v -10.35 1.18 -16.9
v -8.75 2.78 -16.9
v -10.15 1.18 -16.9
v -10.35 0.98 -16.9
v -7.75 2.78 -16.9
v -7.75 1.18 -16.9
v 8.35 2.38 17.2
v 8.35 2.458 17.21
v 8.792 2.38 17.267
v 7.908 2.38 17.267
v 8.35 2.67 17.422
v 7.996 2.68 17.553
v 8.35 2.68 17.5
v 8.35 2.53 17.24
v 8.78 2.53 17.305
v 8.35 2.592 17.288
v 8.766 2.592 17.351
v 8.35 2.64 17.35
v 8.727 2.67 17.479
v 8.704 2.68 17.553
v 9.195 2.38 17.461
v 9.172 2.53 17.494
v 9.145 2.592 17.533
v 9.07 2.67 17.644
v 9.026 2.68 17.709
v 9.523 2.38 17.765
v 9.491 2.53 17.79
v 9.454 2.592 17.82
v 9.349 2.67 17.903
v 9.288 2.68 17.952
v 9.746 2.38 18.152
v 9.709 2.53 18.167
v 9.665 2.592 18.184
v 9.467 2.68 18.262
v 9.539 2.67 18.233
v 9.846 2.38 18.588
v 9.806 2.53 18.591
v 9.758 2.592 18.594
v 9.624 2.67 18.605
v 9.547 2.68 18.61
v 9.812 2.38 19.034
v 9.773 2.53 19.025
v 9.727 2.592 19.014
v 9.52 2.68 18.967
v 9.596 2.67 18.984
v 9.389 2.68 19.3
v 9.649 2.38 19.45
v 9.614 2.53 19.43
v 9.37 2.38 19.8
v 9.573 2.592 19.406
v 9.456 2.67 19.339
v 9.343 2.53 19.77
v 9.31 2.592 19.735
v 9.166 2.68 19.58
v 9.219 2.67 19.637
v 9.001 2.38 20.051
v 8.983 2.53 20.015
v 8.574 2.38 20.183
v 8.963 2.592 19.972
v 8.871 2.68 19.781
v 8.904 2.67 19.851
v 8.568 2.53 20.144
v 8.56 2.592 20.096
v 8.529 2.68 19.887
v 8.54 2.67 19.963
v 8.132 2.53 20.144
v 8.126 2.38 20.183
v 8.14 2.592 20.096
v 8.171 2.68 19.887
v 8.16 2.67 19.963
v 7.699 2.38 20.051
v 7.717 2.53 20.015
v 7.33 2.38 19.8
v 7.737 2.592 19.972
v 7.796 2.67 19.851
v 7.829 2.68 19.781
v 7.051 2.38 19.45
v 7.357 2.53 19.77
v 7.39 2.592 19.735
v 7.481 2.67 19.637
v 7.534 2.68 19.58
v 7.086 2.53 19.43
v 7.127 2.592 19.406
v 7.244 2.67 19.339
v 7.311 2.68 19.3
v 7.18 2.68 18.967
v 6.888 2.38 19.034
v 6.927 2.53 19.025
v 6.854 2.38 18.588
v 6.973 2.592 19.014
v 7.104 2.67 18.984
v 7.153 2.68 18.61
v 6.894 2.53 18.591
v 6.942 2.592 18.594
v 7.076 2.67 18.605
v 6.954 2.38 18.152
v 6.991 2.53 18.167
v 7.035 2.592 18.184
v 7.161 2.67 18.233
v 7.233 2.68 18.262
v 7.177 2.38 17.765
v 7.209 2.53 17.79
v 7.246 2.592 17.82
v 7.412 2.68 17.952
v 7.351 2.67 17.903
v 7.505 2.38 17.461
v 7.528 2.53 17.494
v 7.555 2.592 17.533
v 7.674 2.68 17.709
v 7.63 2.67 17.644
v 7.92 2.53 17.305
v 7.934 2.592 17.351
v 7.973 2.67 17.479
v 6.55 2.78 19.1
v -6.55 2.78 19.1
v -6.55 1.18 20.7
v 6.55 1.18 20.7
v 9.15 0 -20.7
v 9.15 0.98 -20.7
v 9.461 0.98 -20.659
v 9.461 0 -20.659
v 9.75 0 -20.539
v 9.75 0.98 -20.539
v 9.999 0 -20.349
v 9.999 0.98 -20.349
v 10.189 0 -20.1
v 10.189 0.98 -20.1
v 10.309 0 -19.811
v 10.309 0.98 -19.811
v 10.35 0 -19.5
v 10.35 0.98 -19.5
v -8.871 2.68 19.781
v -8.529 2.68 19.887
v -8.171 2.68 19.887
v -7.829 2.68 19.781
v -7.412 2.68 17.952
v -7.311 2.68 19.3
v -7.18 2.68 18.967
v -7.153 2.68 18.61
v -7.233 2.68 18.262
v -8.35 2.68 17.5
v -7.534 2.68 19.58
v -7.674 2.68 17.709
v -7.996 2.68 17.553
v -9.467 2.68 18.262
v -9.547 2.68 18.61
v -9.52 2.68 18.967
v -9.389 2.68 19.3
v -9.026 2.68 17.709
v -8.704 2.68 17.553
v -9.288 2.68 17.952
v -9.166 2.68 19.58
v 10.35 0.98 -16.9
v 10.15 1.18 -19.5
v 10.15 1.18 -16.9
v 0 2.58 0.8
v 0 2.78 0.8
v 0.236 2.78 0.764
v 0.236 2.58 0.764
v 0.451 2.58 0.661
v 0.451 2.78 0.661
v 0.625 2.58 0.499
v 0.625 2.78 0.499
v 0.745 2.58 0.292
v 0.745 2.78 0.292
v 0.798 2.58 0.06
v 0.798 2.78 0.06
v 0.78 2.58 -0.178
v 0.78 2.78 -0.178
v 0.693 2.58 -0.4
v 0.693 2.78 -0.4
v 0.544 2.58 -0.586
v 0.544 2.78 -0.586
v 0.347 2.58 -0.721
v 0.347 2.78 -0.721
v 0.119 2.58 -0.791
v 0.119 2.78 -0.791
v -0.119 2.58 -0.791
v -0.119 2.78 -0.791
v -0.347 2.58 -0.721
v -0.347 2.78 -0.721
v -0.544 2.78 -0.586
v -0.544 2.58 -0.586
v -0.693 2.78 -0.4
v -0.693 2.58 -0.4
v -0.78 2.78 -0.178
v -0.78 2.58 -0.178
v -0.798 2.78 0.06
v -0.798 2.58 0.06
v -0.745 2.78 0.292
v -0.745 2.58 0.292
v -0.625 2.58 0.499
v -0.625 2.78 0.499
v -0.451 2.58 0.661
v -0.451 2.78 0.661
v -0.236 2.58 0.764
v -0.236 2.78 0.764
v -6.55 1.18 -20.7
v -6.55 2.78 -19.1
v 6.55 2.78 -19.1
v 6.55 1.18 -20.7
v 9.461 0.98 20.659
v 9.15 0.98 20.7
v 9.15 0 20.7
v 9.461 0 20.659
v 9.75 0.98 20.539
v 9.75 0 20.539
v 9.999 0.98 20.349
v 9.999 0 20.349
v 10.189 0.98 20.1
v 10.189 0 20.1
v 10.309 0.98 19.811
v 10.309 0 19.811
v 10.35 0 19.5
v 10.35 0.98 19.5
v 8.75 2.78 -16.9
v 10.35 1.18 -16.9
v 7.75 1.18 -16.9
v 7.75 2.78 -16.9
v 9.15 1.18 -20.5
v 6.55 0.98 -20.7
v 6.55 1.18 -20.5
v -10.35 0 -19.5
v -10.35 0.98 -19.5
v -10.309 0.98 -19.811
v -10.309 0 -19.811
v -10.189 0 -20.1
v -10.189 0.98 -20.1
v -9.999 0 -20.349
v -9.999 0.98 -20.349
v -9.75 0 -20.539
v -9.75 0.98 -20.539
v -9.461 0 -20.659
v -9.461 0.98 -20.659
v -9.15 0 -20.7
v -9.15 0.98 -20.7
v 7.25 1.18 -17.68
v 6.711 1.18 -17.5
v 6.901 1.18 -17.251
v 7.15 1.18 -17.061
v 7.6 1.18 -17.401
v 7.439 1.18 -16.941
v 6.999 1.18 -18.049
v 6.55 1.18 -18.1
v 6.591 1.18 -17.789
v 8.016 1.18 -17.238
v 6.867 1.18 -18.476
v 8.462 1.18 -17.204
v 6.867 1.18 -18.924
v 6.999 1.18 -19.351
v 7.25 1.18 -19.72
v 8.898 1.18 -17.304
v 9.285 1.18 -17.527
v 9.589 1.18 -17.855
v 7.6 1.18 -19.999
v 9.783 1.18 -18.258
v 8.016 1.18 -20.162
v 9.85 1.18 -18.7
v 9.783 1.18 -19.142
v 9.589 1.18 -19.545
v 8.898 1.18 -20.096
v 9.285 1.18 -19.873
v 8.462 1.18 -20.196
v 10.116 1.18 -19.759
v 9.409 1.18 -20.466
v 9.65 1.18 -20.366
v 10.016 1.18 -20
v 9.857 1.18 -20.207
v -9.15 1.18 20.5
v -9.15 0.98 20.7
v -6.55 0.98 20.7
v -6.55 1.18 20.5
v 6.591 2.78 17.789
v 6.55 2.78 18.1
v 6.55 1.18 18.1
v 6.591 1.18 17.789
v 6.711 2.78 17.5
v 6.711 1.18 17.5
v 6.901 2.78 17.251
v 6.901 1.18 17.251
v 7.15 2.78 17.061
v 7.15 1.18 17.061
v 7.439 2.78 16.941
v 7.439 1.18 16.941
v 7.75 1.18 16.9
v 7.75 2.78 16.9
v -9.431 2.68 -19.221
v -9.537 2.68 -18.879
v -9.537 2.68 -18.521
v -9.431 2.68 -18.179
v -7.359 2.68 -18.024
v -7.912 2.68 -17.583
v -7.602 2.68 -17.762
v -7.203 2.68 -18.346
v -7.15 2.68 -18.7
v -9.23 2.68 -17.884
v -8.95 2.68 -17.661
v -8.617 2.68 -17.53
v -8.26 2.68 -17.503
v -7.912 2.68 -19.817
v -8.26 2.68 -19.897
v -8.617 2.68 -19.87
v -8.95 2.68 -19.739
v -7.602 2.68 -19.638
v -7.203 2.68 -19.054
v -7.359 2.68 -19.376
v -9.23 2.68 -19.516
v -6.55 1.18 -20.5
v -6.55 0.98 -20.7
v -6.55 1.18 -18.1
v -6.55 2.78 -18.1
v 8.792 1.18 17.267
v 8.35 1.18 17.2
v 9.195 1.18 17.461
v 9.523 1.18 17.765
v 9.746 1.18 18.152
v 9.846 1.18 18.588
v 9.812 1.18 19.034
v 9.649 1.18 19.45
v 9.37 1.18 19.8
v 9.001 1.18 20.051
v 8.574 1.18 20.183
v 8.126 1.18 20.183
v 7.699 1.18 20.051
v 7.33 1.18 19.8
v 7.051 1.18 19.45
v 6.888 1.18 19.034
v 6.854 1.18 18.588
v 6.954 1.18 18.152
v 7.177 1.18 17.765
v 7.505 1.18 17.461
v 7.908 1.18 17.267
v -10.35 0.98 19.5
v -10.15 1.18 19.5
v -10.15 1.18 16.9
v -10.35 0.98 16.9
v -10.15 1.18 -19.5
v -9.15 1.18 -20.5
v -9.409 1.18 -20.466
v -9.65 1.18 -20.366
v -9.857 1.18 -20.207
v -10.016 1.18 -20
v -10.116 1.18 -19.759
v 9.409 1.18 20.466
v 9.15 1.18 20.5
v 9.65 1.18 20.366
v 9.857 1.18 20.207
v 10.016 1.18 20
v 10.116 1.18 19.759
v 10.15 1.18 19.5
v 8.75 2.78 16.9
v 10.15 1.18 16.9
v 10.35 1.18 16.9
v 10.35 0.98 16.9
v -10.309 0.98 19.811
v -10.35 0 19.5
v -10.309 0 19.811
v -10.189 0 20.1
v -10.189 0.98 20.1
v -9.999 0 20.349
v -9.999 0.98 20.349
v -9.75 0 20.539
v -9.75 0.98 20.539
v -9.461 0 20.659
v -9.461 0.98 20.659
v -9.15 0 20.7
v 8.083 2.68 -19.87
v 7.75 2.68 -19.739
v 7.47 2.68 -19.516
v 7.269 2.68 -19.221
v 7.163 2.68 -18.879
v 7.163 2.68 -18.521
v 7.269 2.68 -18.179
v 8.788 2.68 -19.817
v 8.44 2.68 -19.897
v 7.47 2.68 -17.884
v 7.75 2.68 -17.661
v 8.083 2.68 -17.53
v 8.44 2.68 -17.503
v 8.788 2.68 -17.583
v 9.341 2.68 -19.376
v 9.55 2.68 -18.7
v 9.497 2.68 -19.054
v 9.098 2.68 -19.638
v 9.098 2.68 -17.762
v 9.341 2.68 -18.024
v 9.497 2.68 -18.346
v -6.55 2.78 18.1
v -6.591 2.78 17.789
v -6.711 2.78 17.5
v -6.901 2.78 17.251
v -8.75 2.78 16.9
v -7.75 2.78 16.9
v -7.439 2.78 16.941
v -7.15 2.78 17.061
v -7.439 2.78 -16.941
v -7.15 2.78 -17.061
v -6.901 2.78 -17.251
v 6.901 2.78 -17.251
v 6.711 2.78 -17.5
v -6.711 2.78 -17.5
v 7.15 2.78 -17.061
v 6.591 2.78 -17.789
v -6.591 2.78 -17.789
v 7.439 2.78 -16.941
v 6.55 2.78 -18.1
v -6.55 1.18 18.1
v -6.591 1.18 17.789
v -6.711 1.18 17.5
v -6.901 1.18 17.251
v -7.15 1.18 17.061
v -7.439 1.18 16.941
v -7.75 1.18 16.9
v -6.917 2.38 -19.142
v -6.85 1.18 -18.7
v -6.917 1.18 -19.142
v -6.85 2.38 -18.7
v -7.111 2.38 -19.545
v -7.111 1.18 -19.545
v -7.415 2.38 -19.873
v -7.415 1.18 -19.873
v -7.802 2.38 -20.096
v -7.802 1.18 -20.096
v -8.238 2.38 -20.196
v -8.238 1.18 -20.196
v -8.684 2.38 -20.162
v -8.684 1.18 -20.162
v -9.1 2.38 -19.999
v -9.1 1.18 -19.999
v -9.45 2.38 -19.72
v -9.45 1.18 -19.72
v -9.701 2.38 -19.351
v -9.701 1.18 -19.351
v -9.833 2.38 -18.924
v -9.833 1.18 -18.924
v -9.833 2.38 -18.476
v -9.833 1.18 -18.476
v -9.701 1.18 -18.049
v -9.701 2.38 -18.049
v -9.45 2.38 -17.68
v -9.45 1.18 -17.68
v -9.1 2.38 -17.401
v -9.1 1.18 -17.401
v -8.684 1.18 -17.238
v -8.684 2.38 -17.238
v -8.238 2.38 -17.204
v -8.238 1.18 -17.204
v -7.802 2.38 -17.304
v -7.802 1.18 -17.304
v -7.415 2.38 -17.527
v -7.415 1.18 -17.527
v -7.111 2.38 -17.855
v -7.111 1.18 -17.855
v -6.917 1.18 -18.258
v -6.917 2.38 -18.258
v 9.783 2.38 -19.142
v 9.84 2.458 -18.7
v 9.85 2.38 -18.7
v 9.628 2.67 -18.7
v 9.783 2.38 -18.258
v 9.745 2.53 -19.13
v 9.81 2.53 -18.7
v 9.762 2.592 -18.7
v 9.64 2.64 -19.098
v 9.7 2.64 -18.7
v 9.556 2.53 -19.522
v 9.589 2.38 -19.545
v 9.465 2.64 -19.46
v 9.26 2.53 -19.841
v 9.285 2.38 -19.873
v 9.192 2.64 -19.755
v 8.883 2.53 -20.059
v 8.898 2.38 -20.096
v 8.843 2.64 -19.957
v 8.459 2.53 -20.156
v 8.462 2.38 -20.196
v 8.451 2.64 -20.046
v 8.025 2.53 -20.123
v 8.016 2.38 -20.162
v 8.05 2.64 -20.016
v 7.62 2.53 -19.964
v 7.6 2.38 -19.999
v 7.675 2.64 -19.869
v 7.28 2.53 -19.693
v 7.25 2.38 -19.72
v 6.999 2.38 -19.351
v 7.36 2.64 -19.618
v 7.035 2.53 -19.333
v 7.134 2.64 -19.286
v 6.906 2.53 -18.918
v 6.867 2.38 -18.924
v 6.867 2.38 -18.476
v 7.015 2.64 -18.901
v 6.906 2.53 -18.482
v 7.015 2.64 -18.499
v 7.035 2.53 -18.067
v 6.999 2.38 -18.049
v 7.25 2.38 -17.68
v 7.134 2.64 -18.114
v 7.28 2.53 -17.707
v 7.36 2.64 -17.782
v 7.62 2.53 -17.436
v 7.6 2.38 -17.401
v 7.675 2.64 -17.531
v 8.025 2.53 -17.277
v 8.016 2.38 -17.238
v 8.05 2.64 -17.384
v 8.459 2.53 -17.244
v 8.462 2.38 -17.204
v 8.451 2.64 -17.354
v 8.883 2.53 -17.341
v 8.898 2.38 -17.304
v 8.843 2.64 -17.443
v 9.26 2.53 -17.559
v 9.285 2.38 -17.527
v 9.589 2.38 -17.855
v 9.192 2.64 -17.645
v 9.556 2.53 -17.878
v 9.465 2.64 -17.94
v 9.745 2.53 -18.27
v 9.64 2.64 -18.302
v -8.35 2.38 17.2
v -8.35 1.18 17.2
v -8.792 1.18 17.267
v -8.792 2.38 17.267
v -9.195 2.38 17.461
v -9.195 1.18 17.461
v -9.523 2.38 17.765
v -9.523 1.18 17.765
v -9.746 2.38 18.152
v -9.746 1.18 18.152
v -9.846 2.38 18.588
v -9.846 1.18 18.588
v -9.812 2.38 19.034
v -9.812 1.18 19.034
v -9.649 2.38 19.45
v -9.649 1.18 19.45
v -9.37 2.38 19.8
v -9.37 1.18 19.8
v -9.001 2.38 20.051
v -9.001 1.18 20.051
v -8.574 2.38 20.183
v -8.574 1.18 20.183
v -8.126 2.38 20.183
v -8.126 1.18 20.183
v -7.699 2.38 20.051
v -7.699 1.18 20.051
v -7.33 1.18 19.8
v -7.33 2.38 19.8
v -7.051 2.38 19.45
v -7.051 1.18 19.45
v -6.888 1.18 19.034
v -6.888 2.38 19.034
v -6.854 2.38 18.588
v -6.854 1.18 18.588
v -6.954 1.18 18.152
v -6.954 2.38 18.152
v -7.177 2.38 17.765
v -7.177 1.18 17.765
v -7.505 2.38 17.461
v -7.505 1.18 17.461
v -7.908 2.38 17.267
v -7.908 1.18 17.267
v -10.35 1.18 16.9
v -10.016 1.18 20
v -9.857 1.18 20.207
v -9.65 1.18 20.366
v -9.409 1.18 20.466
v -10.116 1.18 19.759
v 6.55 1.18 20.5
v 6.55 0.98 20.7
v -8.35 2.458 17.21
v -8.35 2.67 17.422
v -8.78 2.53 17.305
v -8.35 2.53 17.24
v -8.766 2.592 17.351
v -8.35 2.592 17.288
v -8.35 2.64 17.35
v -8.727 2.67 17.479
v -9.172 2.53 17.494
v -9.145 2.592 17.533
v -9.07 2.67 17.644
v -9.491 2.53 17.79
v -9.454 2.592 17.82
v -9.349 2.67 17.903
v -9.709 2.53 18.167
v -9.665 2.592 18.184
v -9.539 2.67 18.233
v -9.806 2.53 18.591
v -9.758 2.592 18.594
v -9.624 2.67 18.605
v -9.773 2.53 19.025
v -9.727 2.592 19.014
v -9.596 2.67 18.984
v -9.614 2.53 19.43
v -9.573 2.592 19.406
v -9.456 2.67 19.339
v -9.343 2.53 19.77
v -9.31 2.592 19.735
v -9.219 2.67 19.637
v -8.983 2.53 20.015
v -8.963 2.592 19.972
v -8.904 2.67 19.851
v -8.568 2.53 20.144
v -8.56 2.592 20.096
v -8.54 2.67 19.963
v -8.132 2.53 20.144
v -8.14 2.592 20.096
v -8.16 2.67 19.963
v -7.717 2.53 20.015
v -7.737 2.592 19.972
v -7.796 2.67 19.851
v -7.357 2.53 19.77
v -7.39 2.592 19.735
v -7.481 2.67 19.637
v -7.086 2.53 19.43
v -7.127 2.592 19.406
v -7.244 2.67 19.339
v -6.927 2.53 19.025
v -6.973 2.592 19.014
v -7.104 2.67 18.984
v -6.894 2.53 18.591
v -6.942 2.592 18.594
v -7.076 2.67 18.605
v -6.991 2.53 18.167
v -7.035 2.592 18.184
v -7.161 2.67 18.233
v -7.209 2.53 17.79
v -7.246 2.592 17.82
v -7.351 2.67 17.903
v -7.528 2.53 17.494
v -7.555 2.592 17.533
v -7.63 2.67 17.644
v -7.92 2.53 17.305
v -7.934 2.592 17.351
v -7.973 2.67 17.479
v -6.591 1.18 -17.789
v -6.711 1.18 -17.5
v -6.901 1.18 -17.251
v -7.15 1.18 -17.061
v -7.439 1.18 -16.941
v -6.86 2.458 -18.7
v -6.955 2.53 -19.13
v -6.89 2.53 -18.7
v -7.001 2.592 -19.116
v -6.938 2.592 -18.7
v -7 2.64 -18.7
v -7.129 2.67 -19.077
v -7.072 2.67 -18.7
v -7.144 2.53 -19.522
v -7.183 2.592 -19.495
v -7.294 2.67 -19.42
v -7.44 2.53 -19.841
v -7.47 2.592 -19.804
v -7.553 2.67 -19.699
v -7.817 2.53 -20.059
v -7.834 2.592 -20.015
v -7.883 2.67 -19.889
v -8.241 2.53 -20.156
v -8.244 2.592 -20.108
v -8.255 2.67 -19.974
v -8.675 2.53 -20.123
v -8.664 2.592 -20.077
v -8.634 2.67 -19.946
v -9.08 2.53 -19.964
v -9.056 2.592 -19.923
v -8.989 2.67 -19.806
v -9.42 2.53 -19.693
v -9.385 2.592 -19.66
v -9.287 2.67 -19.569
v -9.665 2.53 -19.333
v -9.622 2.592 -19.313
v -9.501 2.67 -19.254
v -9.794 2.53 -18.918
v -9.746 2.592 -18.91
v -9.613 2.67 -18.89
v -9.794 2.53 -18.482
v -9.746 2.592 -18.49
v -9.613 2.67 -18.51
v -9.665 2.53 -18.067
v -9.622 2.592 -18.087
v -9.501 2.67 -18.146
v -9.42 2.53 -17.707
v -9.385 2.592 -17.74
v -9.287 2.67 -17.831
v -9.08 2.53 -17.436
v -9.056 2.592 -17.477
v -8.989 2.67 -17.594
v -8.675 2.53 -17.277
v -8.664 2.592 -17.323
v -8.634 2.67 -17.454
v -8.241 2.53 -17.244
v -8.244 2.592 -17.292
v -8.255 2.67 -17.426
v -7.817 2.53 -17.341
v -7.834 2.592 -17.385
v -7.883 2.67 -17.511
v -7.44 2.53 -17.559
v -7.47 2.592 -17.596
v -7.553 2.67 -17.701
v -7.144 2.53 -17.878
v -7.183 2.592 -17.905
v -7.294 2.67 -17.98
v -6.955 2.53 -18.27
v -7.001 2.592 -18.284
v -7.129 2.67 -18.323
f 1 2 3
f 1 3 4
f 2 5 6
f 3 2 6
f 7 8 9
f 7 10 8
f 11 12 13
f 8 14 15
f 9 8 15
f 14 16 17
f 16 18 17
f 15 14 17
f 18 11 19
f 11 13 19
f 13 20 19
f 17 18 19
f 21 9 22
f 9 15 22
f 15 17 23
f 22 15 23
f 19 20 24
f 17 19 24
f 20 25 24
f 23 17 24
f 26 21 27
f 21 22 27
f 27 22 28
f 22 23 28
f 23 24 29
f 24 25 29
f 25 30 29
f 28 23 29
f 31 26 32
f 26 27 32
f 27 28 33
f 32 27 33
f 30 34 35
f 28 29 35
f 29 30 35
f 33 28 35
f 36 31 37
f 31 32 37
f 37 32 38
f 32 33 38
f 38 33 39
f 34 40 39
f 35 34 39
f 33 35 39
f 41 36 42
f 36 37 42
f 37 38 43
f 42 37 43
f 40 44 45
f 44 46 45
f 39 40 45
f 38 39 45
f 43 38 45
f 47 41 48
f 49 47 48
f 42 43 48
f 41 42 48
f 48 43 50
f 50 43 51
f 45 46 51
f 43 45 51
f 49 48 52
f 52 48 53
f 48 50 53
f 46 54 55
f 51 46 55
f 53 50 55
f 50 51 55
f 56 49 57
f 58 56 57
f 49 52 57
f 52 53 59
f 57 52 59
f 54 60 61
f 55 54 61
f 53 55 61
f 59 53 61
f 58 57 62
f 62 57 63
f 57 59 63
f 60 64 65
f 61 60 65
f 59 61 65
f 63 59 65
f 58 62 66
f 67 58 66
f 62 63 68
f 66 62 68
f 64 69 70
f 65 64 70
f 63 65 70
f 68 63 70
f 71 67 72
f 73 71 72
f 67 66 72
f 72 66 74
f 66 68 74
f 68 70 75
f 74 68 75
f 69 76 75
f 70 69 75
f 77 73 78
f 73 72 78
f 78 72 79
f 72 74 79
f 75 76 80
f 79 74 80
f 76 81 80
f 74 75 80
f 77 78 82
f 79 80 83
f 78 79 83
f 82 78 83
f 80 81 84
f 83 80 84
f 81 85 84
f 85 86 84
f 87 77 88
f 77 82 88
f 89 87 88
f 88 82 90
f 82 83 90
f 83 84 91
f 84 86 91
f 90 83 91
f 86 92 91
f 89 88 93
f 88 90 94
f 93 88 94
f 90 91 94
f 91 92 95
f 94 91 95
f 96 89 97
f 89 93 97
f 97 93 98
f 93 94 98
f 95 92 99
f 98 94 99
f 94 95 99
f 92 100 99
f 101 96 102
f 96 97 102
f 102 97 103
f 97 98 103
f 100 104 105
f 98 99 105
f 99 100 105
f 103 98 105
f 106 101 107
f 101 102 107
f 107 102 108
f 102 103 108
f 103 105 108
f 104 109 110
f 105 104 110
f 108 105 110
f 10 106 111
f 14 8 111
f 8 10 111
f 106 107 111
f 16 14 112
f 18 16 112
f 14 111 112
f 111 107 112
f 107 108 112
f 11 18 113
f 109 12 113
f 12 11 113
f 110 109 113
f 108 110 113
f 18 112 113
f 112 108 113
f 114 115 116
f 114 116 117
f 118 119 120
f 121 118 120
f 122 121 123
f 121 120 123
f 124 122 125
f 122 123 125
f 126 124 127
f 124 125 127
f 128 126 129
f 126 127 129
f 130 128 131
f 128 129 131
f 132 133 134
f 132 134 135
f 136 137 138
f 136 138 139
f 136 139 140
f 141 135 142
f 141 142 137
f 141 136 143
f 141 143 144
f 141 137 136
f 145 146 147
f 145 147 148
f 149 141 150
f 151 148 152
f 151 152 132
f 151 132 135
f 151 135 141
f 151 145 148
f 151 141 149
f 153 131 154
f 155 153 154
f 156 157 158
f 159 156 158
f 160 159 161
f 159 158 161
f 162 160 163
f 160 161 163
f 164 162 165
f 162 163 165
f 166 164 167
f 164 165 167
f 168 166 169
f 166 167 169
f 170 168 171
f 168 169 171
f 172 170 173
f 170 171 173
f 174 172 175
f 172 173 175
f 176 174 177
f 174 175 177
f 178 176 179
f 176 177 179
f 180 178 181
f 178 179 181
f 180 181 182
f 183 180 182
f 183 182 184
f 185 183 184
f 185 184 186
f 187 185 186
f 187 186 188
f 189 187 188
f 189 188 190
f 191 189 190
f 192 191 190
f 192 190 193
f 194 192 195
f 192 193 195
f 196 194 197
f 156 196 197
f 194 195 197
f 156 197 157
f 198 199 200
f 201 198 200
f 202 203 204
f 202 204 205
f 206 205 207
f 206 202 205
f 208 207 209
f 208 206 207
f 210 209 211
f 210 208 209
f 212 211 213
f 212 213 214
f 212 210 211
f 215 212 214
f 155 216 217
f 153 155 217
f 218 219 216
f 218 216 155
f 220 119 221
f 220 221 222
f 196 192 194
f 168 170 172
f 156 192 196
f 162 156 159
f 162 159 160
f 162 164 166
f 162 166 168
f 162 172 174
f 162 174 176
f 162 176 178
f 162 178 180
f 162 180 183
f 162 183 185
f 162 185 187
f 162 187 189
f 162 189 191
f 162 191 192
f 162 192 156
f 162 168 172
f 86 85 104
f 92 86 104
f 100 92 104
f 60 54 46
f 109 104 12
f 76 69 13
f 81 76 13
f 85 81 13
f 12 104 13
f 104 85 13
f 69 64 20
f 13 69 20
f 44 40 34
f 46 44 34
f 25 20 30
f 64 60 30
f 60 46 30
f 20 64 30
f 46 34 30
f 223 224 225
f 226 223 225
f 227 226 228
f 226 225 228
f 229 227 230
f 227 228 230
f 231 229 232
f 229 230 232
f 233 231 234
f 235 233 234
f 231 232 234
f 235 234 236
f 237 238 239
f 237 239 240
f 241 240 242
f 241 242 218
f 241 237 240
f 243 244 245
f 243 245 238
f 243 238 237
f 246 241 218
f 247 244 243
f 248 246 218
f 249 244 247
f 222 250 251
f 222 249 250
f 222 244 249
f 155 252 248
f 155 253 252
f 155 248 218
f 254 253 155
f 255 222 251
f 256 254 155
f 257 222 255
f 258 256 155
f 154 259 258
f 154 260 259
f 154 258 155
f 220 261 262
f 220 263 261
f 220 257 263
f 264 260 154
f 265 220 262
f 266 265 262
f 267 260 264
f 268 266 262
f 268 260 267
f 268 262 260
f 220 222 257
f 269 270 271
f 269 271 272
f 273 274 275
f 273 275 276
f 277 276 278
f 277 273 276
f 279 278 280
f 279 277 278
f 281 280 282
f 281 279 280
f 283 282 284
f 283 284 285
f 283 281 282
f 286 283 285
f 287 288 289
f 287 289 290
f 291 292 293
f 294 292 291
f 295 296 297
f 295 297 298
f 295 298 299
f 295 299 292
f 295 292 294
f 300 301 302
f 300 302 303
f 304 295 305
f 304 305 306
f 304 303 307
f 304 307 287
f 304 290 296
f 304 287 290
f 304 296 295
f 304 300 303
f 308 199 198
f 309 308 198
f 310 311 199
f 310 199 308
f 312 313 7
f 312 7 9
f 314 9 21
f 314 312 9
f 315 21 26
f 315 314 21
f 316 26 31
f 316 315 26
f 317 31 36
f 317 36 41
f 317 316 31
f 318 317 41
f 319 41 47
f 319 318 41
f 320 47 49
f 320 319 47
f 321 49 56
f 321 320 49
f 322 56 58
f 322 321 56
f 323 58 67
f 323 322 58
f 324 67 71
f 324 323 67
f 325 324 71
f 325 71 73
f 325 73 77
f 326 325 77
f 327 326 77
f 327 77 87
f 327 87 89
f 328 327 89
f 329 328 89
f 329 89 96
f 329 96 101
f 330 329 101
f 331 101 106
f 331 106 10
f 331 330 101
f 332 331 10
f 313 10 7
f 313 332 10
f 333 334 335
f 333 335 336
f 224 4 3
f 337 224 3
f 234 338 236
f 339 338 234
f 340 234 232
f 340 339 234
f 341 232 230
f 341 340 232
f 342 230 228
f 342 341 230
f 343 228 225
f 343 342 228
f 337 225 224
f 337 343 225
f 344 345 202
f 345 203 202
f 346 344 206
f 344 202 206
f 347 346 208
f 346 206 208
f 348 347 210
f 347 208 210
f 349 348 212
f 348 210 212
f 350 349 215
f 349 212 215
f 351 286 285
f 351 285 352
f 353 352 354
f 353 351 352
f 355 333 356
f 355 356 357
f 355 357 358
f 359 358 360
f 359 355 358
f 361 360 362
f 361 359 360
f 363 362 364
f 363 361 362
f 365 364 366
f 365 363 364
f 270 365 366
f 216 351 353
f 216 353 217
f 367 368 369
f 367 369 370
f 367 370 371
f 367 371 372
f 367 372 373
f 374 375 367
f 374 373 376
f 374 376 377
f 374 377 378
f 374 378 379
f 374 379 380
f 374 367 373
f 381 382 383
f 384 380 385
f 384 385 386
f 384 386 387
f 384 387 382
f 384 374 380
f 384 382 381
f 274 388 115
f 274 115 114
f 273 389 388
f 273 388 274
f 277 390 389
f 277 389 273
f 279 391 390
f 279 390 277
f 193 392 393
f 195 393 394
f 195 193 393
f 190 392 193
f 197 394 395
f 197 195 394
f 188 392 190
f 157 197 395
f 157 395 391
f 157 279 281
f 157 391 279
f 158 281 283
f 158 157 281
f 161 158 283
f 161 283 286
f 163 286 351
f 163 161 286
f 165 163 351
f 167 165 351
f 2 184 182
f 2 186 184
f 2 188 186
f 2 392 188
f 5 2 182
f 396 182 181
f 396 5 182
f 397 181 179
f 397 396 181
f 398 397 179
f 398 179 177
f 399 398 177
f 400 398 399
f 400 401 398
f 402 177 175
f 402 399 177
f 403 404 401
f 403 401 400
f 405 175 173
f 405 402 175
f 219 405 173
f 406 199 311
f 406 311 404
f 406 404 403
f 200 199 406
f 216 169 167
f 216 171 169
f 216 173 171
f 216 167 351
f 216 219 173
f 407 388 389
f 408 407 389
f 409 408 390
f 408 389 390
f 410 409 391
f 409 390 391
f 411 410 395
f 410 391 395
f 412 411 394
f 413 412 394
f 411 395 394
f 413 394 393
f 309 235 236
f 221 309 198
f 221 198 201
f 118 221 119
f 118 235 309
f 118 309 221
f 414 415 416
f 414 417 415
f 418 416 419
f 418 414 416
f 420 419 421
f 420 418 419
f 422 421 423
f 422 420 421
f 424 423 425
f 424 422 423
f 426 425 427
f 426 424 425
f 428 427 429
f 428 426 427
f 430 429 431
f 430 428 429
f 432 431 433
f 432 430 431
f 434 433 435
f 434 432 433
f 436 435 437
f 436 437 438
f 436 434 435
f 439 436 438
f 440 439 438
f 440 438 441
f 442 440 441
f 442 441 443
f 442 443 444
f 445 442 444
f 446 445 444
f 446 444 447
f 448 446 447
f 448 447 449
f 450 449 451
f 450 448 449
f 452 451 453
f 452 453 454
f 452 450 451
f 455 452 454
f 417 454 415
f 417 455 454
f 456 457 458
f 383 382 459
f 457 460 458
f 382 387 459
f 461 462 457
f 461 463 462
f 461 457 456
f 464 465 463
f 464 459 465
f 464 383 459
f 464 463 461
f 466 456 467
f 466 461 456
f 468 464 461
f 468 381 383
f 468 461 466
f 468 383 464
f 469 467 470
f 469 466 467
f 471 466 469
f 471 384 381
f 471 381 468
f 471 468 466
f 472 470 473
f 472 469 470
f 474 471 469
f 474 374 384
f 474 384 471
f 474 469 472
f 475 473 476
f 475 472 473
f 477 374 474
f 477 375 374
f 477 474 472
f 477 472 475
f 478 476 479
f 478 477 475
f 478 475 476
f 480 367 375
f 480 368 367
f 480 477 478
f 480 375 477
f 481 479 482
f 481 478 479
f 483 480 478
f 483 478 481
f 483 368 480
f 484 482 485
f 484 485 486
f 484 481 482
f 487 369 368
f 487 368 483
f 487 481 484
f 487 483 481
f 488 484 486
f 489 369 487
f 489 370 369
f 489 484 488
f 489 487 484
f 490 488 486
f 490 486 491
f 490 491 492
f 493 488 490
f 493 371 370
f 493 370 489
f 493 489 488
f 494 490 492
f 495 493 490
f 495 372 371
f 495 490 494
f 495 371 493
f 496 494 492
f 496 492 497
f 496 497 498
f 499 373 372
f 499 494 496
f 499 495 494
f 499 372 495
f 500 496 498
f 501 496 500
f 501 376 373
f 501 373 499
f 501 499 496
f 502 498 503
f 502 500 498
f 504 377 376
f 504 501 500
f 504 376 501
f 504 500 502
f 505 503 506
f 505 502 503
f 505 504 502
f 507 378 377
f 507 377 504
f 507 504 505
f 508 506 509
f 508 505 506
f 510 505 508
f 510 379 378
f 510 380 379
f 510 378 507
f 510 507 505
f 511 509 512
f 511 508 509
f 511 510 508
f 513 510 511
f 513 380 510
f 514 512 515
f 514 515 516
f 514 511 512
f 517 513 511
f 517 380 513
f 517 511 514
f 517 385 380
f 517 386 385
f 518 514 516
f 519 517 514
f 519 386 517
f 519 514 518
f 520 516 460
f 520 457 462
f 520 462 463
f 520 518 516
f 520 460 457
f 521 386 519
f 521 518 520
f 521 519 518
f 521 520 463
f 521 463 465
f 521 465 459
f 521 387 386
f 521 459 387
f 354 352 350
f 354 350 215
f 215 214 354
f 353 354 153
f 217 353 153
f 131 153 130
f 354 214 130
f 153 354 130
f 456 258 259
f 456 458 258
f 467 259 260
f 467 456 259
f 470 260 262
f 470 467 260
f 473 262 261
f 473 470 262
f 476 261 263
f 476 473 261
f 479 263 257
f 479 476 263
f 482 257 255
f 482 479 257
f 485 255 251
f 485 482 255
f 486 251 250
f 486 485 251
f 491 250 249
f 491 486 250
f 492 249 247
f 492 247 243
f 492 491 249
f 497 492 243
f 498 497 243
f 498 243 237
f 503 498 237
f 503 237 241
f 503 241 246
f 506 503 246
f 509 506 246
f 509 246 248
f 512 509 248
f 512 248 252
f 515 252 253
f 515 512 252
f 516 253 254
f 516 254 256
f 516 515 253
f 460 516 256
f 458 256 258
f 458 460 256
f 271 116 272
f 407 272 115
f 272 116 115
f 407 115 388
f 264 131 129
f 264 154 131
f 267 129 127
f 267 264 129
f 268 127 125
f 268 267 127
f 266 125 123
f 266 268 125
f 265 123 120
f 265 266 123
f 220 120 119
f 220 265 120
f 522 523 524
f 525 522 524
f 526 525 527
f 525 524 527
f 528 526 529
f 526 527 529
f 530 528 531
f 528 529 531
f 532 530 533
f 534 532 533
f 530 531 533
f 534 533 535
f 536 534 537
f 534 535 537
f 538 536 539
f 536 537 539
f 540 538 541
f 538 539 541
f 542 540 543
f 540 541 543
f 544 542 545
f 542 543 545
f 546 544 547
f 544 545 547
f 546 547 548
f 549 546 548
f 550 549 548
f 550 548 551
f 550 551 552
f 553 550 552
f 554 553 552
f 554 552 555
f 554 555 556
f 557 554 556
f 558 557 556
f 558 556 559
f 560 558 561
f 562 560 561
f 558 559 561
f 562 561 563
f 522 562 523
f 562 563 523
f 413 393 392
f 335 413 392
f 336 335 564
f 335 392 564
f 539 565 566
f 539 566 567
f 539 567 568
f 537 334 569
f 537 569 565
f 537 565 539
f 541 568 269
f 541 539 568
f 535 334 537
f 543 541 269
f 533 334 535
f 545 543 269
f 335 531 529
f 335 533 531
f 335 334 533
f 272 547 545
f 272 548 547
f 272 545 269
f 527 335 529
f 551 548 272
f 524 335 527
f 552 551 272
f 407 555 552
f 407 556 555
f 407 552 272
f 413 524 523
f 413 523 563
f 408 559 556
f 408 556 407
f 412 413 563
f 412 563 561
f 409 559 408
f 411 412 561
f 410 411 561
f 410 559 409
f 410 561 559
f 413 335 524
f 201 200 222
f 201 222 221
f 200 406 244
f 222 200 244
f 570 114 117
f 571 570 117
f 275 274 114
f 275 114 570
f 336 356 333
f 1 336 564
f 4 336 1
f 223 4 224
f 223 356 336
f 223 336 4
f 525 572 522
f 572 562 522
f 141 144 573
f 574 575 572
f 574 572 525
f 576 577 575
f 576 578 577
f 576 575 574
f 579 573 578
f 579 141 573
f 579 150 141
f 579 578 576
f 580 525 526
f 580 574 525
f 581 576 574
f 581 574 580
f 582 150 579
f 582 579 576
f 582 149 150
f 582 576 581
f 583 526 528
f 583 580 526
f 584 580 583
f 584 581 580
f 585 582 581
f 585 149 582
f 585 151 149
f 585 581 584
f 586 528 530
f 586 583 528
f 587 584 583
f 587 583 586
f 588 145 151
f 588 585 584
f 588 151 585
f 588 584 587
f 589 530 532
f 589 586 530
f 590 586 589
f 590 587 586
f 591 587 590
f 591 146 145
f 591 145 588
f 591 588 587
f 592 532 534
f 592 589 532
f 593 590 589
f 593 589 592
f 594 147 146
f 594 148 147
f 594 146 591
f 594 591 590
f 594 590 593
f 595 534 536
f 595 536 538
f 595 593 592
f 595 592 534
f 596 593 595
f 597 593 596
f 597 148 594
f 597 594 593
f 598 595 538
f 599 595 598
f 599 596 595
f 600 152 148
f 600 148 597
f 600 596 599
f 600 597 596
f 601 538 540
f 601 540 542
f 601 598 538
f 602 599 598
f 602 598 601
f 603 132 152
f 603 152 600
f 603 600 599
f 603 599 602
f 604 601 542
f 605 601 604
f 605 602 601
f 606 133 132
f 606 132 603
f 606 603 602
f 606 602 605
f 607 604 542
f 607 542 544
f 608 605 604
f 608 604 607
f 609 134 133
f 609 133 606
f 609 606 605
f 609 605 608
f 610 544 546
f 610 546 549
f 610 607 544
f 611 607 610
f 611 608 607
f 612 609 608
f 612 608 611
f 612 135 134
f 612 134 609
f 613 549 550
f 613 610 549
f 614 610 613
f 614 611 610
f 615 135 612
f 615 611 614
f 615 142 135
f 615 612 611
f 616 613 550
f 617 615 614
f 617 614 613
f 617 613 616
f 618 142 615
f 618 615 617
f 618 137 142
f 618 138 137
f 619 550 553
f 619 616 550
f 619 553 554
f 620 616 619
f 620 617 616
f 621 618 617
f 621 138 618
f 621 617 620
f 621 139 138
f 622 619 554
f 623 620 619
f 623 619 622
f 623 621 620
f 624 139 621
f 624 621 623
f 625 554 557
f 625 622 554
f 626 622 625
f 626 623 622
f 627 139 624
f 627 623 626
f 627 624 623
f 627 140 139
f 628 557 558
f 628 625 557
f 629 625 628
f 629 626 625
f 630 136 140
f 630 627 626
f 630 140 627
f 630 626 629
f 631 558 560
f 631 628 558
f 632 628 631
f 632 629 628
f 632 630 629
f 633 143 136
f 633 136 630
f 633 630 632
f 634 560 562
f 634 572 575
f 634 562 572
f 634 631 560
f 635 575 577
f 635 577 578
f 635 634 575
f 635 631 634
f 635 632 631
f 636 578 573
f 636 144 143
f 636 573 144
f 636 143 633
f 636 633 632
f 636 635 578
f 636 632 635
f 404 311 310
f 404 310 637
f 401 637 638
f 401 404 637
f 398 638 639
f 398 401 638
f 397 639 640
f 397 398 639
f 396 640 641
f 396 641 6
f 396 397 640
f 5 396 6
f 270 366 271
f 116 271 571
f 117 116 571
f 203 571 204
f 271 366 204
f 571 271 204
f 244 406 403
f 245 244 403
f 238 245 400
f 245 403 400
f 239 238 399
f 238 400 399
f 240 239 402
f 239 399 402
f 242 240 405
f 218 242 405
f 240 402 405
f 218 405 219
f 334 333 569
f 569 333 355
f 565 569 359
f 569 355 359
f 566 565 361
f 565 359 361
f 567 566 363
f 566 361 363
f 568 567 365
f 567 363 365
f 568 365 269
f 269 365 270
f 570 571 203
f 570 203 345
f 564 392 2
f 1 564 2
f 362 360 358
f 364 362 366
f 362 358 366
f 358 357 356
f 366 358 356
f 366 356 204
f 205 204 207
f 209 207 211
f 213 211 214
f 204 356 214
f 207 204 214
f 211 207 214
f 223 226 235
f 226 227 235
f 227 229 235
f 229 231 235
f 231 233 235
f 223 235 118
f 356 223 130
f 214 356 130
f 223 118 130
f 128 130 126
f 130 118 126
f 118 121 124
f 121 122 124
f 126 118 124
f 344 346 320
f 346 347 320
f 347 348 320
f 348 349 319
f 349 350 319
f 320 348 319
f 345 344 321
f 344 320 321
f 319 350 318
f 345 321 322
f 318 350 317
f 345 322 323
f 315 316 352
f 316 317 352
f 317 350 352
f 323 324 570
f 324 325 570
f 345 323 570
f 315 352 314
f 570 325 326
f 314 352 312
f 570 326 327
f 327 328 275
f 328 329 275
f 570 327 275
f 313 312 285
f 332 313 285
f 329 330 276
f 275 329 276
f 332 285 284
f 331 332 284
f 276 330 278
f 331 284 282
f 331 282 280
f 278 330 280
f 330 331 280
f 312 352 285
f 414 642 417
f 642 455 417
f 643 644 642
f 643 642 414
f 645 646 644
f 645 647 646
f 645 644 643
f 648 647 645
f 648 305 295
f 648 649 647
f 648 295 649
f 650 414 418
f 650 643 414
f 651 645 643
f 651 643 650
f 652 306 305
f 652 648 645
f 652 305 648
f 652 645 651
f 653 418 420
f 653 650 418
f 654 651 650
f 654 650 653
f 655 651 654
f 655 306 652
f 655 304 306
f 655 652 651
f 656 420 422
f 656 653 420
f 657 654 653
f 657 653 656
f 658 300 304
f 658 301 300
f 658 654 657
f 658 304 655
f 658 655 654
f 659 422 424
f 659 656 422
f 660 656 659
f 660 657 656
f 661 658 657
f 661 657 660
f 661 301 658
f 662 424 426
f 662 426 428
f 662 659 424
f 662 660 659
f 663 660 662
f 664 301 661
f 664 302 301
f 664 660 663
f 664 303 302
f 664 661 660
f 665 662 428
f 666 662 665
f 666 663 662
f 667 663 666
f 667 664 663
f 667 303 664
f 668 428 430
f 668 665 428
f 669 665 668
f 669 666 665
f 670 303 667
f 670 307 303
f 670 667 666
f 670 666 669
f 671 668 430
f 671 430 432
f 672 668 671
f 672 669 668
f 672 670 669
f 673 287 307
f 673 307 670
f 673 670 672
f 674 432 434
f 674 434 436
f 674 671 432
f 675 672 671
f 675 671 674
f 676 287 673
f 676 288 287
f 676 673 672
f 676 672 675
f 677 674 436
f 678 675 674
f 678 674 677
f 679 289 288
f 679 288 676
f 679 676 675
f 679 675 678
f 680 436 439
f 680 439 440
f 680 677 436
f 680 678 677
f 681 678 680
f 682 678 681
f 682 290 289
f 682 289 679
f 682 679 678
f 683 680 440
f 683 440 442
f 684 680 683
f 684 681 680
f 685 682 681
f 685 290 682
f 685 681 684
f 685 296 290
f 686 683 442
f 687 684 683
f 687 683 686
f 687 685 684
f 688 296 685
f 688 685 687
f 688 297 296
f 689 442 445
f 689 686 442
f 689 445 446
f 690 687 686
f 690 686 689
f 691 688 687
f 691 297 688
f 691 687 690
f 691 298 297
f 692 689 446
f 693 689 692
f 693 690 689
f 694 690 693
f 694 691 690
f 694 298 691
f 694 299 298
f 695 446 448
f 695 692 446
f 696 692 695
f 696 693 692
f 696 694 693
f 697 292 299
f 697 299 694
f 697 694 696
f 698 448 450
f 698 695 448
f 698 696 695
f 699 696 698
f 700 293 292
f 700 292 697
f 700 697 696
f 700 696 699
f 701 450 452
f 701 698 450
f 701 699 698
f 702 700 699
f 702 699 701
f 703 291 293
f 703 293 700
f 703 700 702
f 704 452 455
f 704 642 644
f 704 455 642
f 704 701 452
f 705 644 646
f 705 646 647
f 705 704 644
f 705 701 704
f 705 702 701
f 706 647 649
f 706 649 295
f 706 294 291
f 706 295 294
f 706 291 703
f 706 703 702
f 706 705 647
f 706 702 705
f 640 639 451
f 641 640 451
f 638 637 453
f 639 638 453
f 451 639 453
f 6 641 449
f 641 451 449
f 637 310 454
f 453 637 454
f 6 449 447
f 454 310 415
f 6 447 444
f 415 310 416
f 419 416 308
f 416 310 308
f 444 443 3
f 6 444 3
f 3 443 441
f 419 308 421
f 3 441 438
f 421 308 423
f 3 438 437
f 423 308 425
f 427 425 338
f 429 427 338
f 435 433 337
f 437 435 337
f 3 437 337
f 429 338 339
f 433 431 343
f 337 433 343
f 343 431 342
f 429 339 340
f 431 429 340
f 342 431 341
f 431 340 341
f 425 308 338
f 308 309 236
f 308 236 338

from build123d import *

# Parameters (mm, degrees)
CROQUIS1_W               = 20.7
CROQUIS1_H               = 41.4
SALIENTE_EXTRUIR1_DEPTH  = 2.78
CHAFL_N1_SIZE            = 1.6
CROQUIS4_R               = 0.8
CORTAR_EXTRUIR2_DEPTH    = 0.2
REDONDEO5_R              = 1.2
CORTAR_EXTRUIR5_DEPTH    = 1.6
CHAFL_N2_SIZE            = 0.2
CROQUIS10_R              = 1.5
SALIENTE_EXTRUIR2_DEPTH  = 1.5
REDONDEO6_R              = 0.3
REDONDEO6_OF_SIMETR_A1_R = 0.3


# Read off the part's stored shape, not the designer's step: Simetría4
with BuildPart() as part:
    # Croquis1 → Saliente-Extruir1 (new body)
    with BuildSketch(Plane(origin=(0, 0, 0), x_dir=(1, 0, 0), z_dir=(0, 1, 0))):
        Rectangle(CROQUIS1_W, CROQUIS1_H)
    extrude(amount=SALIENTE_EXTRUIR1_DEPTH)

    # Chaflán1
    chafl_n1_edges = [part.edges().sort_by_distance(p)[0] for p in [
        (-10.35, 2.78, 0),
        (0, 2.78, 20.7),
        (10.35, 2.78, 0),
        (0, 2.78, -20.7),
    ]]
    chamfer(chafl_n1_edges, length=CHAFL_N1_SIZE)

    # Croquis4 → Cortar-Extruir2 (cut)
    with BuildSketch(Plane(origin=(0, 2.78, 0), x_dir=(1, 0, 0), z_dir=(0, 1, 0))):
        with Locations(Location((0, 0, 0), (0, 0, 270))):
            Circle(CROQUIS4_R)
    extrude(amount=-CORTAR_EXTRUIR2_DEPTH, mode=Mode.SUBTRACT)

    # Redondeo5
    redondeo5_edges = [part.edges().sort_by_distance(p)[0] for p in [
        (10.35, 0.59, 20.7),
        (-10.35, 0.59, 20.7),
        (-10.35, 0.59, -20.7),
        (10.35, 0.59, -20.7),
    ]]
    fillet(redondeo5_edges, radius=REDONDEO5_R)

    # Croquis8 → Cortar-Extruir5 (cut)
    with BuildSketch(Plane(origin=(0, 2.78, 0), x_dir=(1, 0, 0), z_dir=(0, 1, 0))):
        with BuildLine():
            Line((-10.35, -20.7), (-6.55, -20.7))
            Line((-6.55, -20.7), (-6.55, -18.1))
            ThreePointArc((-6.55, -18.1), (-6.901471863, -17.251471863), (-7.75, -16.9))
            Line((-7.75, -16.9), (-10.35, -16.9))
            Line((-10.35, -16.9), (-10.35, -20.7))
        make_face()
        with BuildLine():
            Line((6.55, -20.7), (6.55, -18.1))
            ThreePointArc((6.55, -18.1), (6.901471863, -17.251471863), (7.75, -16.9))
            Line((7.75, -16.9), (10.35, -16.9))
            Line((10.35, -16.9), (10.35, -20.7))
            Line((10.35, -20.7), (6.55, -20.7))
        make_face()
        with BuildLine():
            Line((10.35, 20.7), (6.55, 20.7))
            Line((6.55, 20.7), (6.55, 18.1))
            ThreePointArc((6.55, 18.1), (6.901471863, 17.251471863), (7.75, 16.9))
            Line((7.75, 16.9), (10.35, 16.9))
            Line((10.35, 16.9), (10.35, 20.7))
        make_face()
        with BuildLine():
            Line((-6.55, 20.7), (-6.55, 18.1))
            ThreePointArc((-6.55, 18.1), (-6.901471863, 17.251471863), (-7.75, 16.9))
            Line((-7.75, 16.9), (-10.35, 16.9))
            Line((-10.35, 16.9), (-10.35, 20.7))
            Line((-10.35, 20.7), (-6.55, 20.7))
        make_face()
    extrude(amount=-CORTAR_EXTRUIR5_DEPTH, mode=Mode.SUBTRACT)

    # Chaflán2
    # the kernel refuses this chamfer: 0.2 mm, written as the material it takes off along each edge
    with BuildSketch(Plane(origin=(9.15, 1.18, -19.5), x_dir=(1, 0, 0), z_dir=(0, 0, 1))) as chafl_n2_piece_1:
        Polygon((1.2, -CHAFL_N2_SIZE), (1.2 - CHAFL_N2_SIZE, 0), (1.2, 0), align=None)
    revolve(axis=Axis((9.15, 1.18, -19.5), (0, 1, 0)), revolution_arc=90, mode=Mode.SUBTRACT)
    with BuildSketch(Plane(origin=(9.15, 1.18, -20.7), x_dir=(0, -0.999621916911297, -0.027495876610578732), z_dir=(-1, 0, 0)), Plane(origin=(-10.35, 1.18, -19.5), x_dir=(-0.02749587661058736, -0.9996219169112966, 0), z_dir=(0, 0, 1)), Plane(origin=(-6.55, 1.18, -20.7), x_dir=(0, -0.999621916911297, -0.027495876610578732), z_dir=(-1, 0, 0)), Plane(origin=(10.35, 1.18, -16.9), x_dir=(0.02749587661058736, -0.9996219169112966, 0), z_dir=(0, 0, -1)), Plane(origin=(6.55, 1.18, 20.7), x_dir=(0, -0.999621916911297, 0.027495876610578732), z_dir=(1, 0, 0)), Plane(origin=(-9.15, 1.18, 20.7), x_dir=(0, -0.999621916911297, 0.027495876610578732), z_dir=(1, 0, 0))) as chafl_n2_piece_2:
        Polygon((CHAFL_N2_SIZE * 0.999621916911, CHAFL_N2_SIZE * 0.0274958766106), (-CHAFL_N2_SIZE * 0.0274958766106, CHAFL_N2_SIZE * 0.999621916911), (0, 0), align=None)
    extrude(amount=2.6, mode=Mode.SUBTRACT)
    with BuildSketch(Plane(origin=(-9.15, 1.18, -19.5), x_dir=(0, 0, -1), z_dir=(1, 0, 0))) as chafl_n2_piece_3:
        Polygon((1.2, -CHAFL_N2_SIZE), (1.2 - CHAFL_N2_SIZE, 0), (1.2, 0), align=None)
    revolve(axis=Axis((-9.15, 1.18, -19.5), (0, 1, 0)), revolution_arc=90, mode=Mode.SUBTRACT)
    with BuildSketch(Plane(origin=(-10.35, 1.18, 16.9), x_dir=(0.9996219169112966, 0.02749587661058634, 0), z_dir=(0, 0, 1)), Plane(origin=(10.35, 1.18, 19.5), x_dir=(-0.9996219169112966, 0.02749587661058634, 0), z_dir=(0, 0, -1))) as chafl_n2_piece_4:
        Polygon((CHAFL_N2_SIZE * 0.999621916911, -CHAFL_N2_SIZE * 0.0274958766106), (-CHAFL_N2_SIZE * 0.0274958766106, -CHAFL_N2_SIZE * 0.999621916911), (0, 0), align=None)
    extrude(amount=2.6, mode=Mode.SUBTRACT)
    with BuildSketch(Plane(origin=(-9.15, 1.18, 19.5), x_dir=(-1, 0, 0), z_dir=(0, 0, -1))) as chafl_n2_piece_5:
        Polygon((1.2 - CHAFL_N2_SIZE, 0), (1.2, -CHAFL_N2_SIZE), (1.2, 0), align=None)
    revolve(axis=Axis((-9.15, 1.18, 19.5), (0, 1, 0)), revolution_arc=90, mode=Mode.SUBTRACT)
    with BuildSketch(Plane(origin=(9.15, 1.18, 19.5), x_dir=(0, 0, 1), z_dir=(-1, 0, 0))) as chafl_n2_piece_6:
        Polygon((1.2 - CHAFL_N2_SIZE, 0), (1.2, -CHAFL_N2_SIZE), (1.2, 0), align=None)
    revolve(axis=Axis((9.15, 1.18, 19.5), (0, 1, 0)), revolution_arc=90, mode=Mode.SUBTRACT)

    # Croquis10 → Saliente-Extruir2 (add)
    with BuildSketch(Plane(origin=(0, 1.18, 0), x_dir=(1, 0, 0), z_dir=(0, 1, 0))):
        with Locations(Location((-8.35, -18.7, 0), (0, 0, 90))):
            Circle(CROQUIS10_R)
    saliente_extruir2 = extrude(amount=SALIENTE_EXTRUIR2_DEPTH)

    # Redondeo6
    redondeo6_edges = [part.edges().sort_by_distance(p)[0] for p in [
        (-8.35, 2.68, 20.2),
    ]]
    fillet(redondeo6_edges, radius=REDONDEO6_R)

    # Simetría1: Saliente-Extruir2 across plane
    add(saliente_extruir2.mirror(Plane(origin=(0, 0, 0), x_dir=(0, 0, 1), z_dir=(1, 0, 0))))

    # Redondeo6 of Simetría1
    redondeo6_of_simetr_a1_edges = [part.edges().sort_by_distance(p)[0] for p in [
        (8.35, 2.68, 20.2),
    ]]
    fillet(redondeo6_of_simetr_a1_edges, radius=REDONDEO6_OF_SIMETR_A1_R)

    # Simetría4 outline → Simetría4 (revolve)
    with BuildSketch(Plane(origin=(8.35, 0, -18.7), x_dir=(1, 0, 0), z_dir=(0, 0, 1))):
        with BuildLine():
            Line((1.2, 2.68), (0, 2.68))
            Line((0, 2.68), (0, 1.18))
            Line((0, 1.18), (1.5, 1.18))
            Line((1.5, 1.18), (1.5, 2.38))
            ThreePointArc((1.5, 2.38), (1.412132034, 2.592132034), (1.2, 2.68))
        make_face()
    revolve(axis=Axis((8.35, 0, -18.7), (0, 1, 0)))

    # Simetr_a4 2 outline → Simetr_a4 2 (revolve)
    with BuildSketch(Plane(origin=(-8.35, 0, -18.7), x_dir=(1, 0, 0), z_dir=(0, 0, 1))):
        with BuildLine():
            Line((1.2, 2.68), (0, 2.68))
            Line((0, 2.68), (0, 1.18))
            Line((0, 1.18), (1.5, 1.18))
            Line((1.5, 1.18), (1.5, 2.38))
            ThreePointArc((1.5, 2.38), (1.412132034, 2.592132034), (1.2, 2.68))
        make_face()
    revolve(axis=Axis((-8.35, 0, -18.7), (0, 1, 0)))


solid = part.part
